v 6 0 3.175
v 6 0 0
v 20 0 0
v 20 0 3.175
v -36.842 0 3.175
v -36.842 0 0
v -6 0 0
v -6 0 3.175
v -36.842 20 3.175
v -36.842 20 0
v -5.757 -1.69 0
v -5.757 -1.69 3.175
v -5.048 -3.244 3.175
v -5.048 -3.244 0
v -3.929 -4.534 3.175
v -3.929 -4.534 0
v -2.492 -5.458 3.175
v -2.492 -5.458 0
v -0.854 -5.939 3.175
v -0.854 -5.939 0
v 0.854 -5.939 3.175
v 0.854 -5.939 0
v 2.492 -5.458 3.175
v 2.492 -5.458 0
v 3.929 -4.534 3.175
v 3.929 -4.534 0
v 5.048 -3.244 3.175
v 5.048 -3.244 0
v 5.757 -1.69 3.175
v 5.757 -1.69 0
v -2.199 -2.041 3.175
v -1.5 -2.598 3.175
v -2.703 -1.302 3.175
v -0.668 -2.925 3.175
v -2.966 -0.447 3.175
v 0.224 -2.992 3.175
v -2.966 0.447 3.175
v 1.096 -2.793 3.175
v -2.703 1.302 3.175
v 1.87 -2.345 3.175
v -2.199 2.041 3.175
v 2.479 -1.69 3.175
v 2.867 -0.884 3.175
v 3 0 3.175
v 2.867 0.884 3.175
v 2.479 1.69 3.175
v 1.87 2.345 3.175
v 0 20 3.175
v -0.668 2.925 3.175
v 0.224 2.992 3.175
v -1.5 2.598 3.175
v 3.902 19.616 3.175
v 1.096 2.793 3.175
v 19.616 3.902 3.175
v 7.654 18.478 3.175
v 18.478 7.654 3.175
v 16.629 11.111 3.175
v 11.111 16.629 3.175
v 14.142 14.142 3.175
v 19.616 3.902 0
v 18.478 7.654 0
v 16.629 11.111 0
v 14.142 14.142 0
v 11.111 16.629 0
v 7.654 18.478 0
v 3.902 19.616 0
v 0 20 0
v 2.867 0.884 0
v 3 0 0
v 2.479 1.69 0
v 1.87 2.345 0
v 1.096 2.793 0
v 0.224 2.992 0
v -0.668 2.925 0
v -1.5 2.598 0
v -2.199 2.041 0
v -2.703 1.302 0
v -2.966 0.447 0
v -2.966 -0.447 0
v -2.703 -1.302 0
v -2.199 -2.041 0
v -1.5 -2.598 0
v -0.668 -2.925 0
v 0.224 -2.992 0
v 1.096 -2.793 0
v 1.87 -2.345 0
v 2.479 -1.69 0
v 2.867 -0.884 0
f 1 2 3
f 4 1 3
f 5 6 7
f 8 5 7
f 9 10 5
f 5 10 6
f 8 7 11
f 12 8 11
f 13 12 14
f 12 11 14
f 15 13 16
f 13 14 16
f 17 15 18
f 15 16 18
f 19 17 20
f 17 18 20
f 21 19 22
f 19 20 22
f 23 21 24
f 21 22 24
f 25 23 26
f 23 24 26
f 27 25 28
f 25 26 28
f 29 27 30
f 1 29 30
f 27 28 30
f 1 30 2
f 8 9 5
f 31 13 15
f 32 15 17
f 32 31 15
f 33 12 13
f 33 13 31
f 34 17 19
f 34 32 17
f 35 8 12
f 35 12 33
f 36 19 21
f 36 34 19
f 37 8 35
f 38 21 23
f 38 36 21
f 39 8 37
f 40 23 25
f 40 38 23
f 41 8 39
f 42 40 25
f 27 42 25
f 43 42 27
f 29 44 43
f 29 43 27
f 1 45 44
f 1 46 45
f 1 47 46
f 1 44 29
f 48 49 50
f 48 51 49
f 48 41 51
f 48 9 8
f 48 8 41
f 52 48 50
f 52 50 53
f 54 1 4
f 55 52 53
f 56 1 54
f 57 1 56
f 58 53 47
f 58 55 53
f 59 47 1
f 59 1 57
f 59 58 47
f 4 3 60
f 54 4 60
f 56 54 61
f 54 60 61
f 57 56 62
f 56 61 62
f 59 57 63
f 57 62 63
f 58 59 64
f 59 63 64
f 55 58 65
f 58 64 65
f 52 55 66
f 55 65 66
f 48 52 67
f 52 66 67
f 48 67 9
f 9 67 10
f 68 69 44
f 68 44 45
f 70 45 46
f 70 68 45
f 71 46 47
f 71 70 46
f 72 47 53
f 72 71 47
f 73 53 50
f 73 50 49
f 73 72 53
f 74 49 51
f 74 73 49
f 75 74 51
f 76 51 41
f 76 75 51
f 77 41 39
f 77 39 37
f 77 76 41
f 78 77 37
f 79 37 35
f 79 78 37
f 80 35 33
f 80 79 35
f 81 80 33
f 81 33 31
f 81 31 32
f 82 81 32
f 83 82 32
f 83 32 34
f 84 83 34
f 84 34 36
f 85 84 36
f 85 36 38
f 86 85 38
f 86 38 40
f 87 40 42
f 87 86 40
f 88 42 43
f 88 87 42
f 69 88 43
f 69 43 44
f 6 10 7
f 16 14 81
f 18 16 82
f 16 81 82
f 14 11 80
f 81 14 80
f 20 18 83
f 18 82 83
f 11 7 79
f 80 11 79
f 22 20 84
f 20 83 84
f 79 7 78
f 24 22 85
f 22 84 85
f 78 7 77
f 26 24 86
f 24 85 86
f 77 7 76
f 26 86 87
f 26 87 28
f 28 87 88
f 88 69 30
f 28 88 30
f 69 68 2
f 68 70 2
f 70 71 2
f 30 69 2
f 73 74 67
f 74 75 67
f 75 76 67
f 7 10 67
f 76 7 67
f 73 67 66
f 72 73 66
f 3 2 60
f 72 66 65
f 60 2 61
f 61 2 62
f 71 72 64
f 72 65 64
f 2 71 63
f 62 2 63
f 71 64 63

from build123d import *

# Parameters (mm, degrees)
SKETCH1_R           = 3
BOSS_EXTRUDE1_DEPTH = 3.175


with BuildPart() as part:
    # Sketch1 → Boss-Extrude1 (new body)
    with BuildSketch(Plane.XY):
        with BuildLine():
            ThreePointArc((-6, 0), (0, -6), (6, 0))
            Line((6, 0), (20, 0))
            ThreePointArc((20, 0), (14.142135624, 14.142135624), (0, 20))
            Line((0, 20), (-36.84213525, 20))
            Line((-36.84213525, 20), (-36.84213525, 0))
            Line((-36.84213525, 0), (-6, 0))
        make_face()
        Circle(SKETCH1_R, mode=Mode.SUBTRACT)
    extrude(amount=BOSS_EXTRUDE1_DEPTH)


solid = part.part
